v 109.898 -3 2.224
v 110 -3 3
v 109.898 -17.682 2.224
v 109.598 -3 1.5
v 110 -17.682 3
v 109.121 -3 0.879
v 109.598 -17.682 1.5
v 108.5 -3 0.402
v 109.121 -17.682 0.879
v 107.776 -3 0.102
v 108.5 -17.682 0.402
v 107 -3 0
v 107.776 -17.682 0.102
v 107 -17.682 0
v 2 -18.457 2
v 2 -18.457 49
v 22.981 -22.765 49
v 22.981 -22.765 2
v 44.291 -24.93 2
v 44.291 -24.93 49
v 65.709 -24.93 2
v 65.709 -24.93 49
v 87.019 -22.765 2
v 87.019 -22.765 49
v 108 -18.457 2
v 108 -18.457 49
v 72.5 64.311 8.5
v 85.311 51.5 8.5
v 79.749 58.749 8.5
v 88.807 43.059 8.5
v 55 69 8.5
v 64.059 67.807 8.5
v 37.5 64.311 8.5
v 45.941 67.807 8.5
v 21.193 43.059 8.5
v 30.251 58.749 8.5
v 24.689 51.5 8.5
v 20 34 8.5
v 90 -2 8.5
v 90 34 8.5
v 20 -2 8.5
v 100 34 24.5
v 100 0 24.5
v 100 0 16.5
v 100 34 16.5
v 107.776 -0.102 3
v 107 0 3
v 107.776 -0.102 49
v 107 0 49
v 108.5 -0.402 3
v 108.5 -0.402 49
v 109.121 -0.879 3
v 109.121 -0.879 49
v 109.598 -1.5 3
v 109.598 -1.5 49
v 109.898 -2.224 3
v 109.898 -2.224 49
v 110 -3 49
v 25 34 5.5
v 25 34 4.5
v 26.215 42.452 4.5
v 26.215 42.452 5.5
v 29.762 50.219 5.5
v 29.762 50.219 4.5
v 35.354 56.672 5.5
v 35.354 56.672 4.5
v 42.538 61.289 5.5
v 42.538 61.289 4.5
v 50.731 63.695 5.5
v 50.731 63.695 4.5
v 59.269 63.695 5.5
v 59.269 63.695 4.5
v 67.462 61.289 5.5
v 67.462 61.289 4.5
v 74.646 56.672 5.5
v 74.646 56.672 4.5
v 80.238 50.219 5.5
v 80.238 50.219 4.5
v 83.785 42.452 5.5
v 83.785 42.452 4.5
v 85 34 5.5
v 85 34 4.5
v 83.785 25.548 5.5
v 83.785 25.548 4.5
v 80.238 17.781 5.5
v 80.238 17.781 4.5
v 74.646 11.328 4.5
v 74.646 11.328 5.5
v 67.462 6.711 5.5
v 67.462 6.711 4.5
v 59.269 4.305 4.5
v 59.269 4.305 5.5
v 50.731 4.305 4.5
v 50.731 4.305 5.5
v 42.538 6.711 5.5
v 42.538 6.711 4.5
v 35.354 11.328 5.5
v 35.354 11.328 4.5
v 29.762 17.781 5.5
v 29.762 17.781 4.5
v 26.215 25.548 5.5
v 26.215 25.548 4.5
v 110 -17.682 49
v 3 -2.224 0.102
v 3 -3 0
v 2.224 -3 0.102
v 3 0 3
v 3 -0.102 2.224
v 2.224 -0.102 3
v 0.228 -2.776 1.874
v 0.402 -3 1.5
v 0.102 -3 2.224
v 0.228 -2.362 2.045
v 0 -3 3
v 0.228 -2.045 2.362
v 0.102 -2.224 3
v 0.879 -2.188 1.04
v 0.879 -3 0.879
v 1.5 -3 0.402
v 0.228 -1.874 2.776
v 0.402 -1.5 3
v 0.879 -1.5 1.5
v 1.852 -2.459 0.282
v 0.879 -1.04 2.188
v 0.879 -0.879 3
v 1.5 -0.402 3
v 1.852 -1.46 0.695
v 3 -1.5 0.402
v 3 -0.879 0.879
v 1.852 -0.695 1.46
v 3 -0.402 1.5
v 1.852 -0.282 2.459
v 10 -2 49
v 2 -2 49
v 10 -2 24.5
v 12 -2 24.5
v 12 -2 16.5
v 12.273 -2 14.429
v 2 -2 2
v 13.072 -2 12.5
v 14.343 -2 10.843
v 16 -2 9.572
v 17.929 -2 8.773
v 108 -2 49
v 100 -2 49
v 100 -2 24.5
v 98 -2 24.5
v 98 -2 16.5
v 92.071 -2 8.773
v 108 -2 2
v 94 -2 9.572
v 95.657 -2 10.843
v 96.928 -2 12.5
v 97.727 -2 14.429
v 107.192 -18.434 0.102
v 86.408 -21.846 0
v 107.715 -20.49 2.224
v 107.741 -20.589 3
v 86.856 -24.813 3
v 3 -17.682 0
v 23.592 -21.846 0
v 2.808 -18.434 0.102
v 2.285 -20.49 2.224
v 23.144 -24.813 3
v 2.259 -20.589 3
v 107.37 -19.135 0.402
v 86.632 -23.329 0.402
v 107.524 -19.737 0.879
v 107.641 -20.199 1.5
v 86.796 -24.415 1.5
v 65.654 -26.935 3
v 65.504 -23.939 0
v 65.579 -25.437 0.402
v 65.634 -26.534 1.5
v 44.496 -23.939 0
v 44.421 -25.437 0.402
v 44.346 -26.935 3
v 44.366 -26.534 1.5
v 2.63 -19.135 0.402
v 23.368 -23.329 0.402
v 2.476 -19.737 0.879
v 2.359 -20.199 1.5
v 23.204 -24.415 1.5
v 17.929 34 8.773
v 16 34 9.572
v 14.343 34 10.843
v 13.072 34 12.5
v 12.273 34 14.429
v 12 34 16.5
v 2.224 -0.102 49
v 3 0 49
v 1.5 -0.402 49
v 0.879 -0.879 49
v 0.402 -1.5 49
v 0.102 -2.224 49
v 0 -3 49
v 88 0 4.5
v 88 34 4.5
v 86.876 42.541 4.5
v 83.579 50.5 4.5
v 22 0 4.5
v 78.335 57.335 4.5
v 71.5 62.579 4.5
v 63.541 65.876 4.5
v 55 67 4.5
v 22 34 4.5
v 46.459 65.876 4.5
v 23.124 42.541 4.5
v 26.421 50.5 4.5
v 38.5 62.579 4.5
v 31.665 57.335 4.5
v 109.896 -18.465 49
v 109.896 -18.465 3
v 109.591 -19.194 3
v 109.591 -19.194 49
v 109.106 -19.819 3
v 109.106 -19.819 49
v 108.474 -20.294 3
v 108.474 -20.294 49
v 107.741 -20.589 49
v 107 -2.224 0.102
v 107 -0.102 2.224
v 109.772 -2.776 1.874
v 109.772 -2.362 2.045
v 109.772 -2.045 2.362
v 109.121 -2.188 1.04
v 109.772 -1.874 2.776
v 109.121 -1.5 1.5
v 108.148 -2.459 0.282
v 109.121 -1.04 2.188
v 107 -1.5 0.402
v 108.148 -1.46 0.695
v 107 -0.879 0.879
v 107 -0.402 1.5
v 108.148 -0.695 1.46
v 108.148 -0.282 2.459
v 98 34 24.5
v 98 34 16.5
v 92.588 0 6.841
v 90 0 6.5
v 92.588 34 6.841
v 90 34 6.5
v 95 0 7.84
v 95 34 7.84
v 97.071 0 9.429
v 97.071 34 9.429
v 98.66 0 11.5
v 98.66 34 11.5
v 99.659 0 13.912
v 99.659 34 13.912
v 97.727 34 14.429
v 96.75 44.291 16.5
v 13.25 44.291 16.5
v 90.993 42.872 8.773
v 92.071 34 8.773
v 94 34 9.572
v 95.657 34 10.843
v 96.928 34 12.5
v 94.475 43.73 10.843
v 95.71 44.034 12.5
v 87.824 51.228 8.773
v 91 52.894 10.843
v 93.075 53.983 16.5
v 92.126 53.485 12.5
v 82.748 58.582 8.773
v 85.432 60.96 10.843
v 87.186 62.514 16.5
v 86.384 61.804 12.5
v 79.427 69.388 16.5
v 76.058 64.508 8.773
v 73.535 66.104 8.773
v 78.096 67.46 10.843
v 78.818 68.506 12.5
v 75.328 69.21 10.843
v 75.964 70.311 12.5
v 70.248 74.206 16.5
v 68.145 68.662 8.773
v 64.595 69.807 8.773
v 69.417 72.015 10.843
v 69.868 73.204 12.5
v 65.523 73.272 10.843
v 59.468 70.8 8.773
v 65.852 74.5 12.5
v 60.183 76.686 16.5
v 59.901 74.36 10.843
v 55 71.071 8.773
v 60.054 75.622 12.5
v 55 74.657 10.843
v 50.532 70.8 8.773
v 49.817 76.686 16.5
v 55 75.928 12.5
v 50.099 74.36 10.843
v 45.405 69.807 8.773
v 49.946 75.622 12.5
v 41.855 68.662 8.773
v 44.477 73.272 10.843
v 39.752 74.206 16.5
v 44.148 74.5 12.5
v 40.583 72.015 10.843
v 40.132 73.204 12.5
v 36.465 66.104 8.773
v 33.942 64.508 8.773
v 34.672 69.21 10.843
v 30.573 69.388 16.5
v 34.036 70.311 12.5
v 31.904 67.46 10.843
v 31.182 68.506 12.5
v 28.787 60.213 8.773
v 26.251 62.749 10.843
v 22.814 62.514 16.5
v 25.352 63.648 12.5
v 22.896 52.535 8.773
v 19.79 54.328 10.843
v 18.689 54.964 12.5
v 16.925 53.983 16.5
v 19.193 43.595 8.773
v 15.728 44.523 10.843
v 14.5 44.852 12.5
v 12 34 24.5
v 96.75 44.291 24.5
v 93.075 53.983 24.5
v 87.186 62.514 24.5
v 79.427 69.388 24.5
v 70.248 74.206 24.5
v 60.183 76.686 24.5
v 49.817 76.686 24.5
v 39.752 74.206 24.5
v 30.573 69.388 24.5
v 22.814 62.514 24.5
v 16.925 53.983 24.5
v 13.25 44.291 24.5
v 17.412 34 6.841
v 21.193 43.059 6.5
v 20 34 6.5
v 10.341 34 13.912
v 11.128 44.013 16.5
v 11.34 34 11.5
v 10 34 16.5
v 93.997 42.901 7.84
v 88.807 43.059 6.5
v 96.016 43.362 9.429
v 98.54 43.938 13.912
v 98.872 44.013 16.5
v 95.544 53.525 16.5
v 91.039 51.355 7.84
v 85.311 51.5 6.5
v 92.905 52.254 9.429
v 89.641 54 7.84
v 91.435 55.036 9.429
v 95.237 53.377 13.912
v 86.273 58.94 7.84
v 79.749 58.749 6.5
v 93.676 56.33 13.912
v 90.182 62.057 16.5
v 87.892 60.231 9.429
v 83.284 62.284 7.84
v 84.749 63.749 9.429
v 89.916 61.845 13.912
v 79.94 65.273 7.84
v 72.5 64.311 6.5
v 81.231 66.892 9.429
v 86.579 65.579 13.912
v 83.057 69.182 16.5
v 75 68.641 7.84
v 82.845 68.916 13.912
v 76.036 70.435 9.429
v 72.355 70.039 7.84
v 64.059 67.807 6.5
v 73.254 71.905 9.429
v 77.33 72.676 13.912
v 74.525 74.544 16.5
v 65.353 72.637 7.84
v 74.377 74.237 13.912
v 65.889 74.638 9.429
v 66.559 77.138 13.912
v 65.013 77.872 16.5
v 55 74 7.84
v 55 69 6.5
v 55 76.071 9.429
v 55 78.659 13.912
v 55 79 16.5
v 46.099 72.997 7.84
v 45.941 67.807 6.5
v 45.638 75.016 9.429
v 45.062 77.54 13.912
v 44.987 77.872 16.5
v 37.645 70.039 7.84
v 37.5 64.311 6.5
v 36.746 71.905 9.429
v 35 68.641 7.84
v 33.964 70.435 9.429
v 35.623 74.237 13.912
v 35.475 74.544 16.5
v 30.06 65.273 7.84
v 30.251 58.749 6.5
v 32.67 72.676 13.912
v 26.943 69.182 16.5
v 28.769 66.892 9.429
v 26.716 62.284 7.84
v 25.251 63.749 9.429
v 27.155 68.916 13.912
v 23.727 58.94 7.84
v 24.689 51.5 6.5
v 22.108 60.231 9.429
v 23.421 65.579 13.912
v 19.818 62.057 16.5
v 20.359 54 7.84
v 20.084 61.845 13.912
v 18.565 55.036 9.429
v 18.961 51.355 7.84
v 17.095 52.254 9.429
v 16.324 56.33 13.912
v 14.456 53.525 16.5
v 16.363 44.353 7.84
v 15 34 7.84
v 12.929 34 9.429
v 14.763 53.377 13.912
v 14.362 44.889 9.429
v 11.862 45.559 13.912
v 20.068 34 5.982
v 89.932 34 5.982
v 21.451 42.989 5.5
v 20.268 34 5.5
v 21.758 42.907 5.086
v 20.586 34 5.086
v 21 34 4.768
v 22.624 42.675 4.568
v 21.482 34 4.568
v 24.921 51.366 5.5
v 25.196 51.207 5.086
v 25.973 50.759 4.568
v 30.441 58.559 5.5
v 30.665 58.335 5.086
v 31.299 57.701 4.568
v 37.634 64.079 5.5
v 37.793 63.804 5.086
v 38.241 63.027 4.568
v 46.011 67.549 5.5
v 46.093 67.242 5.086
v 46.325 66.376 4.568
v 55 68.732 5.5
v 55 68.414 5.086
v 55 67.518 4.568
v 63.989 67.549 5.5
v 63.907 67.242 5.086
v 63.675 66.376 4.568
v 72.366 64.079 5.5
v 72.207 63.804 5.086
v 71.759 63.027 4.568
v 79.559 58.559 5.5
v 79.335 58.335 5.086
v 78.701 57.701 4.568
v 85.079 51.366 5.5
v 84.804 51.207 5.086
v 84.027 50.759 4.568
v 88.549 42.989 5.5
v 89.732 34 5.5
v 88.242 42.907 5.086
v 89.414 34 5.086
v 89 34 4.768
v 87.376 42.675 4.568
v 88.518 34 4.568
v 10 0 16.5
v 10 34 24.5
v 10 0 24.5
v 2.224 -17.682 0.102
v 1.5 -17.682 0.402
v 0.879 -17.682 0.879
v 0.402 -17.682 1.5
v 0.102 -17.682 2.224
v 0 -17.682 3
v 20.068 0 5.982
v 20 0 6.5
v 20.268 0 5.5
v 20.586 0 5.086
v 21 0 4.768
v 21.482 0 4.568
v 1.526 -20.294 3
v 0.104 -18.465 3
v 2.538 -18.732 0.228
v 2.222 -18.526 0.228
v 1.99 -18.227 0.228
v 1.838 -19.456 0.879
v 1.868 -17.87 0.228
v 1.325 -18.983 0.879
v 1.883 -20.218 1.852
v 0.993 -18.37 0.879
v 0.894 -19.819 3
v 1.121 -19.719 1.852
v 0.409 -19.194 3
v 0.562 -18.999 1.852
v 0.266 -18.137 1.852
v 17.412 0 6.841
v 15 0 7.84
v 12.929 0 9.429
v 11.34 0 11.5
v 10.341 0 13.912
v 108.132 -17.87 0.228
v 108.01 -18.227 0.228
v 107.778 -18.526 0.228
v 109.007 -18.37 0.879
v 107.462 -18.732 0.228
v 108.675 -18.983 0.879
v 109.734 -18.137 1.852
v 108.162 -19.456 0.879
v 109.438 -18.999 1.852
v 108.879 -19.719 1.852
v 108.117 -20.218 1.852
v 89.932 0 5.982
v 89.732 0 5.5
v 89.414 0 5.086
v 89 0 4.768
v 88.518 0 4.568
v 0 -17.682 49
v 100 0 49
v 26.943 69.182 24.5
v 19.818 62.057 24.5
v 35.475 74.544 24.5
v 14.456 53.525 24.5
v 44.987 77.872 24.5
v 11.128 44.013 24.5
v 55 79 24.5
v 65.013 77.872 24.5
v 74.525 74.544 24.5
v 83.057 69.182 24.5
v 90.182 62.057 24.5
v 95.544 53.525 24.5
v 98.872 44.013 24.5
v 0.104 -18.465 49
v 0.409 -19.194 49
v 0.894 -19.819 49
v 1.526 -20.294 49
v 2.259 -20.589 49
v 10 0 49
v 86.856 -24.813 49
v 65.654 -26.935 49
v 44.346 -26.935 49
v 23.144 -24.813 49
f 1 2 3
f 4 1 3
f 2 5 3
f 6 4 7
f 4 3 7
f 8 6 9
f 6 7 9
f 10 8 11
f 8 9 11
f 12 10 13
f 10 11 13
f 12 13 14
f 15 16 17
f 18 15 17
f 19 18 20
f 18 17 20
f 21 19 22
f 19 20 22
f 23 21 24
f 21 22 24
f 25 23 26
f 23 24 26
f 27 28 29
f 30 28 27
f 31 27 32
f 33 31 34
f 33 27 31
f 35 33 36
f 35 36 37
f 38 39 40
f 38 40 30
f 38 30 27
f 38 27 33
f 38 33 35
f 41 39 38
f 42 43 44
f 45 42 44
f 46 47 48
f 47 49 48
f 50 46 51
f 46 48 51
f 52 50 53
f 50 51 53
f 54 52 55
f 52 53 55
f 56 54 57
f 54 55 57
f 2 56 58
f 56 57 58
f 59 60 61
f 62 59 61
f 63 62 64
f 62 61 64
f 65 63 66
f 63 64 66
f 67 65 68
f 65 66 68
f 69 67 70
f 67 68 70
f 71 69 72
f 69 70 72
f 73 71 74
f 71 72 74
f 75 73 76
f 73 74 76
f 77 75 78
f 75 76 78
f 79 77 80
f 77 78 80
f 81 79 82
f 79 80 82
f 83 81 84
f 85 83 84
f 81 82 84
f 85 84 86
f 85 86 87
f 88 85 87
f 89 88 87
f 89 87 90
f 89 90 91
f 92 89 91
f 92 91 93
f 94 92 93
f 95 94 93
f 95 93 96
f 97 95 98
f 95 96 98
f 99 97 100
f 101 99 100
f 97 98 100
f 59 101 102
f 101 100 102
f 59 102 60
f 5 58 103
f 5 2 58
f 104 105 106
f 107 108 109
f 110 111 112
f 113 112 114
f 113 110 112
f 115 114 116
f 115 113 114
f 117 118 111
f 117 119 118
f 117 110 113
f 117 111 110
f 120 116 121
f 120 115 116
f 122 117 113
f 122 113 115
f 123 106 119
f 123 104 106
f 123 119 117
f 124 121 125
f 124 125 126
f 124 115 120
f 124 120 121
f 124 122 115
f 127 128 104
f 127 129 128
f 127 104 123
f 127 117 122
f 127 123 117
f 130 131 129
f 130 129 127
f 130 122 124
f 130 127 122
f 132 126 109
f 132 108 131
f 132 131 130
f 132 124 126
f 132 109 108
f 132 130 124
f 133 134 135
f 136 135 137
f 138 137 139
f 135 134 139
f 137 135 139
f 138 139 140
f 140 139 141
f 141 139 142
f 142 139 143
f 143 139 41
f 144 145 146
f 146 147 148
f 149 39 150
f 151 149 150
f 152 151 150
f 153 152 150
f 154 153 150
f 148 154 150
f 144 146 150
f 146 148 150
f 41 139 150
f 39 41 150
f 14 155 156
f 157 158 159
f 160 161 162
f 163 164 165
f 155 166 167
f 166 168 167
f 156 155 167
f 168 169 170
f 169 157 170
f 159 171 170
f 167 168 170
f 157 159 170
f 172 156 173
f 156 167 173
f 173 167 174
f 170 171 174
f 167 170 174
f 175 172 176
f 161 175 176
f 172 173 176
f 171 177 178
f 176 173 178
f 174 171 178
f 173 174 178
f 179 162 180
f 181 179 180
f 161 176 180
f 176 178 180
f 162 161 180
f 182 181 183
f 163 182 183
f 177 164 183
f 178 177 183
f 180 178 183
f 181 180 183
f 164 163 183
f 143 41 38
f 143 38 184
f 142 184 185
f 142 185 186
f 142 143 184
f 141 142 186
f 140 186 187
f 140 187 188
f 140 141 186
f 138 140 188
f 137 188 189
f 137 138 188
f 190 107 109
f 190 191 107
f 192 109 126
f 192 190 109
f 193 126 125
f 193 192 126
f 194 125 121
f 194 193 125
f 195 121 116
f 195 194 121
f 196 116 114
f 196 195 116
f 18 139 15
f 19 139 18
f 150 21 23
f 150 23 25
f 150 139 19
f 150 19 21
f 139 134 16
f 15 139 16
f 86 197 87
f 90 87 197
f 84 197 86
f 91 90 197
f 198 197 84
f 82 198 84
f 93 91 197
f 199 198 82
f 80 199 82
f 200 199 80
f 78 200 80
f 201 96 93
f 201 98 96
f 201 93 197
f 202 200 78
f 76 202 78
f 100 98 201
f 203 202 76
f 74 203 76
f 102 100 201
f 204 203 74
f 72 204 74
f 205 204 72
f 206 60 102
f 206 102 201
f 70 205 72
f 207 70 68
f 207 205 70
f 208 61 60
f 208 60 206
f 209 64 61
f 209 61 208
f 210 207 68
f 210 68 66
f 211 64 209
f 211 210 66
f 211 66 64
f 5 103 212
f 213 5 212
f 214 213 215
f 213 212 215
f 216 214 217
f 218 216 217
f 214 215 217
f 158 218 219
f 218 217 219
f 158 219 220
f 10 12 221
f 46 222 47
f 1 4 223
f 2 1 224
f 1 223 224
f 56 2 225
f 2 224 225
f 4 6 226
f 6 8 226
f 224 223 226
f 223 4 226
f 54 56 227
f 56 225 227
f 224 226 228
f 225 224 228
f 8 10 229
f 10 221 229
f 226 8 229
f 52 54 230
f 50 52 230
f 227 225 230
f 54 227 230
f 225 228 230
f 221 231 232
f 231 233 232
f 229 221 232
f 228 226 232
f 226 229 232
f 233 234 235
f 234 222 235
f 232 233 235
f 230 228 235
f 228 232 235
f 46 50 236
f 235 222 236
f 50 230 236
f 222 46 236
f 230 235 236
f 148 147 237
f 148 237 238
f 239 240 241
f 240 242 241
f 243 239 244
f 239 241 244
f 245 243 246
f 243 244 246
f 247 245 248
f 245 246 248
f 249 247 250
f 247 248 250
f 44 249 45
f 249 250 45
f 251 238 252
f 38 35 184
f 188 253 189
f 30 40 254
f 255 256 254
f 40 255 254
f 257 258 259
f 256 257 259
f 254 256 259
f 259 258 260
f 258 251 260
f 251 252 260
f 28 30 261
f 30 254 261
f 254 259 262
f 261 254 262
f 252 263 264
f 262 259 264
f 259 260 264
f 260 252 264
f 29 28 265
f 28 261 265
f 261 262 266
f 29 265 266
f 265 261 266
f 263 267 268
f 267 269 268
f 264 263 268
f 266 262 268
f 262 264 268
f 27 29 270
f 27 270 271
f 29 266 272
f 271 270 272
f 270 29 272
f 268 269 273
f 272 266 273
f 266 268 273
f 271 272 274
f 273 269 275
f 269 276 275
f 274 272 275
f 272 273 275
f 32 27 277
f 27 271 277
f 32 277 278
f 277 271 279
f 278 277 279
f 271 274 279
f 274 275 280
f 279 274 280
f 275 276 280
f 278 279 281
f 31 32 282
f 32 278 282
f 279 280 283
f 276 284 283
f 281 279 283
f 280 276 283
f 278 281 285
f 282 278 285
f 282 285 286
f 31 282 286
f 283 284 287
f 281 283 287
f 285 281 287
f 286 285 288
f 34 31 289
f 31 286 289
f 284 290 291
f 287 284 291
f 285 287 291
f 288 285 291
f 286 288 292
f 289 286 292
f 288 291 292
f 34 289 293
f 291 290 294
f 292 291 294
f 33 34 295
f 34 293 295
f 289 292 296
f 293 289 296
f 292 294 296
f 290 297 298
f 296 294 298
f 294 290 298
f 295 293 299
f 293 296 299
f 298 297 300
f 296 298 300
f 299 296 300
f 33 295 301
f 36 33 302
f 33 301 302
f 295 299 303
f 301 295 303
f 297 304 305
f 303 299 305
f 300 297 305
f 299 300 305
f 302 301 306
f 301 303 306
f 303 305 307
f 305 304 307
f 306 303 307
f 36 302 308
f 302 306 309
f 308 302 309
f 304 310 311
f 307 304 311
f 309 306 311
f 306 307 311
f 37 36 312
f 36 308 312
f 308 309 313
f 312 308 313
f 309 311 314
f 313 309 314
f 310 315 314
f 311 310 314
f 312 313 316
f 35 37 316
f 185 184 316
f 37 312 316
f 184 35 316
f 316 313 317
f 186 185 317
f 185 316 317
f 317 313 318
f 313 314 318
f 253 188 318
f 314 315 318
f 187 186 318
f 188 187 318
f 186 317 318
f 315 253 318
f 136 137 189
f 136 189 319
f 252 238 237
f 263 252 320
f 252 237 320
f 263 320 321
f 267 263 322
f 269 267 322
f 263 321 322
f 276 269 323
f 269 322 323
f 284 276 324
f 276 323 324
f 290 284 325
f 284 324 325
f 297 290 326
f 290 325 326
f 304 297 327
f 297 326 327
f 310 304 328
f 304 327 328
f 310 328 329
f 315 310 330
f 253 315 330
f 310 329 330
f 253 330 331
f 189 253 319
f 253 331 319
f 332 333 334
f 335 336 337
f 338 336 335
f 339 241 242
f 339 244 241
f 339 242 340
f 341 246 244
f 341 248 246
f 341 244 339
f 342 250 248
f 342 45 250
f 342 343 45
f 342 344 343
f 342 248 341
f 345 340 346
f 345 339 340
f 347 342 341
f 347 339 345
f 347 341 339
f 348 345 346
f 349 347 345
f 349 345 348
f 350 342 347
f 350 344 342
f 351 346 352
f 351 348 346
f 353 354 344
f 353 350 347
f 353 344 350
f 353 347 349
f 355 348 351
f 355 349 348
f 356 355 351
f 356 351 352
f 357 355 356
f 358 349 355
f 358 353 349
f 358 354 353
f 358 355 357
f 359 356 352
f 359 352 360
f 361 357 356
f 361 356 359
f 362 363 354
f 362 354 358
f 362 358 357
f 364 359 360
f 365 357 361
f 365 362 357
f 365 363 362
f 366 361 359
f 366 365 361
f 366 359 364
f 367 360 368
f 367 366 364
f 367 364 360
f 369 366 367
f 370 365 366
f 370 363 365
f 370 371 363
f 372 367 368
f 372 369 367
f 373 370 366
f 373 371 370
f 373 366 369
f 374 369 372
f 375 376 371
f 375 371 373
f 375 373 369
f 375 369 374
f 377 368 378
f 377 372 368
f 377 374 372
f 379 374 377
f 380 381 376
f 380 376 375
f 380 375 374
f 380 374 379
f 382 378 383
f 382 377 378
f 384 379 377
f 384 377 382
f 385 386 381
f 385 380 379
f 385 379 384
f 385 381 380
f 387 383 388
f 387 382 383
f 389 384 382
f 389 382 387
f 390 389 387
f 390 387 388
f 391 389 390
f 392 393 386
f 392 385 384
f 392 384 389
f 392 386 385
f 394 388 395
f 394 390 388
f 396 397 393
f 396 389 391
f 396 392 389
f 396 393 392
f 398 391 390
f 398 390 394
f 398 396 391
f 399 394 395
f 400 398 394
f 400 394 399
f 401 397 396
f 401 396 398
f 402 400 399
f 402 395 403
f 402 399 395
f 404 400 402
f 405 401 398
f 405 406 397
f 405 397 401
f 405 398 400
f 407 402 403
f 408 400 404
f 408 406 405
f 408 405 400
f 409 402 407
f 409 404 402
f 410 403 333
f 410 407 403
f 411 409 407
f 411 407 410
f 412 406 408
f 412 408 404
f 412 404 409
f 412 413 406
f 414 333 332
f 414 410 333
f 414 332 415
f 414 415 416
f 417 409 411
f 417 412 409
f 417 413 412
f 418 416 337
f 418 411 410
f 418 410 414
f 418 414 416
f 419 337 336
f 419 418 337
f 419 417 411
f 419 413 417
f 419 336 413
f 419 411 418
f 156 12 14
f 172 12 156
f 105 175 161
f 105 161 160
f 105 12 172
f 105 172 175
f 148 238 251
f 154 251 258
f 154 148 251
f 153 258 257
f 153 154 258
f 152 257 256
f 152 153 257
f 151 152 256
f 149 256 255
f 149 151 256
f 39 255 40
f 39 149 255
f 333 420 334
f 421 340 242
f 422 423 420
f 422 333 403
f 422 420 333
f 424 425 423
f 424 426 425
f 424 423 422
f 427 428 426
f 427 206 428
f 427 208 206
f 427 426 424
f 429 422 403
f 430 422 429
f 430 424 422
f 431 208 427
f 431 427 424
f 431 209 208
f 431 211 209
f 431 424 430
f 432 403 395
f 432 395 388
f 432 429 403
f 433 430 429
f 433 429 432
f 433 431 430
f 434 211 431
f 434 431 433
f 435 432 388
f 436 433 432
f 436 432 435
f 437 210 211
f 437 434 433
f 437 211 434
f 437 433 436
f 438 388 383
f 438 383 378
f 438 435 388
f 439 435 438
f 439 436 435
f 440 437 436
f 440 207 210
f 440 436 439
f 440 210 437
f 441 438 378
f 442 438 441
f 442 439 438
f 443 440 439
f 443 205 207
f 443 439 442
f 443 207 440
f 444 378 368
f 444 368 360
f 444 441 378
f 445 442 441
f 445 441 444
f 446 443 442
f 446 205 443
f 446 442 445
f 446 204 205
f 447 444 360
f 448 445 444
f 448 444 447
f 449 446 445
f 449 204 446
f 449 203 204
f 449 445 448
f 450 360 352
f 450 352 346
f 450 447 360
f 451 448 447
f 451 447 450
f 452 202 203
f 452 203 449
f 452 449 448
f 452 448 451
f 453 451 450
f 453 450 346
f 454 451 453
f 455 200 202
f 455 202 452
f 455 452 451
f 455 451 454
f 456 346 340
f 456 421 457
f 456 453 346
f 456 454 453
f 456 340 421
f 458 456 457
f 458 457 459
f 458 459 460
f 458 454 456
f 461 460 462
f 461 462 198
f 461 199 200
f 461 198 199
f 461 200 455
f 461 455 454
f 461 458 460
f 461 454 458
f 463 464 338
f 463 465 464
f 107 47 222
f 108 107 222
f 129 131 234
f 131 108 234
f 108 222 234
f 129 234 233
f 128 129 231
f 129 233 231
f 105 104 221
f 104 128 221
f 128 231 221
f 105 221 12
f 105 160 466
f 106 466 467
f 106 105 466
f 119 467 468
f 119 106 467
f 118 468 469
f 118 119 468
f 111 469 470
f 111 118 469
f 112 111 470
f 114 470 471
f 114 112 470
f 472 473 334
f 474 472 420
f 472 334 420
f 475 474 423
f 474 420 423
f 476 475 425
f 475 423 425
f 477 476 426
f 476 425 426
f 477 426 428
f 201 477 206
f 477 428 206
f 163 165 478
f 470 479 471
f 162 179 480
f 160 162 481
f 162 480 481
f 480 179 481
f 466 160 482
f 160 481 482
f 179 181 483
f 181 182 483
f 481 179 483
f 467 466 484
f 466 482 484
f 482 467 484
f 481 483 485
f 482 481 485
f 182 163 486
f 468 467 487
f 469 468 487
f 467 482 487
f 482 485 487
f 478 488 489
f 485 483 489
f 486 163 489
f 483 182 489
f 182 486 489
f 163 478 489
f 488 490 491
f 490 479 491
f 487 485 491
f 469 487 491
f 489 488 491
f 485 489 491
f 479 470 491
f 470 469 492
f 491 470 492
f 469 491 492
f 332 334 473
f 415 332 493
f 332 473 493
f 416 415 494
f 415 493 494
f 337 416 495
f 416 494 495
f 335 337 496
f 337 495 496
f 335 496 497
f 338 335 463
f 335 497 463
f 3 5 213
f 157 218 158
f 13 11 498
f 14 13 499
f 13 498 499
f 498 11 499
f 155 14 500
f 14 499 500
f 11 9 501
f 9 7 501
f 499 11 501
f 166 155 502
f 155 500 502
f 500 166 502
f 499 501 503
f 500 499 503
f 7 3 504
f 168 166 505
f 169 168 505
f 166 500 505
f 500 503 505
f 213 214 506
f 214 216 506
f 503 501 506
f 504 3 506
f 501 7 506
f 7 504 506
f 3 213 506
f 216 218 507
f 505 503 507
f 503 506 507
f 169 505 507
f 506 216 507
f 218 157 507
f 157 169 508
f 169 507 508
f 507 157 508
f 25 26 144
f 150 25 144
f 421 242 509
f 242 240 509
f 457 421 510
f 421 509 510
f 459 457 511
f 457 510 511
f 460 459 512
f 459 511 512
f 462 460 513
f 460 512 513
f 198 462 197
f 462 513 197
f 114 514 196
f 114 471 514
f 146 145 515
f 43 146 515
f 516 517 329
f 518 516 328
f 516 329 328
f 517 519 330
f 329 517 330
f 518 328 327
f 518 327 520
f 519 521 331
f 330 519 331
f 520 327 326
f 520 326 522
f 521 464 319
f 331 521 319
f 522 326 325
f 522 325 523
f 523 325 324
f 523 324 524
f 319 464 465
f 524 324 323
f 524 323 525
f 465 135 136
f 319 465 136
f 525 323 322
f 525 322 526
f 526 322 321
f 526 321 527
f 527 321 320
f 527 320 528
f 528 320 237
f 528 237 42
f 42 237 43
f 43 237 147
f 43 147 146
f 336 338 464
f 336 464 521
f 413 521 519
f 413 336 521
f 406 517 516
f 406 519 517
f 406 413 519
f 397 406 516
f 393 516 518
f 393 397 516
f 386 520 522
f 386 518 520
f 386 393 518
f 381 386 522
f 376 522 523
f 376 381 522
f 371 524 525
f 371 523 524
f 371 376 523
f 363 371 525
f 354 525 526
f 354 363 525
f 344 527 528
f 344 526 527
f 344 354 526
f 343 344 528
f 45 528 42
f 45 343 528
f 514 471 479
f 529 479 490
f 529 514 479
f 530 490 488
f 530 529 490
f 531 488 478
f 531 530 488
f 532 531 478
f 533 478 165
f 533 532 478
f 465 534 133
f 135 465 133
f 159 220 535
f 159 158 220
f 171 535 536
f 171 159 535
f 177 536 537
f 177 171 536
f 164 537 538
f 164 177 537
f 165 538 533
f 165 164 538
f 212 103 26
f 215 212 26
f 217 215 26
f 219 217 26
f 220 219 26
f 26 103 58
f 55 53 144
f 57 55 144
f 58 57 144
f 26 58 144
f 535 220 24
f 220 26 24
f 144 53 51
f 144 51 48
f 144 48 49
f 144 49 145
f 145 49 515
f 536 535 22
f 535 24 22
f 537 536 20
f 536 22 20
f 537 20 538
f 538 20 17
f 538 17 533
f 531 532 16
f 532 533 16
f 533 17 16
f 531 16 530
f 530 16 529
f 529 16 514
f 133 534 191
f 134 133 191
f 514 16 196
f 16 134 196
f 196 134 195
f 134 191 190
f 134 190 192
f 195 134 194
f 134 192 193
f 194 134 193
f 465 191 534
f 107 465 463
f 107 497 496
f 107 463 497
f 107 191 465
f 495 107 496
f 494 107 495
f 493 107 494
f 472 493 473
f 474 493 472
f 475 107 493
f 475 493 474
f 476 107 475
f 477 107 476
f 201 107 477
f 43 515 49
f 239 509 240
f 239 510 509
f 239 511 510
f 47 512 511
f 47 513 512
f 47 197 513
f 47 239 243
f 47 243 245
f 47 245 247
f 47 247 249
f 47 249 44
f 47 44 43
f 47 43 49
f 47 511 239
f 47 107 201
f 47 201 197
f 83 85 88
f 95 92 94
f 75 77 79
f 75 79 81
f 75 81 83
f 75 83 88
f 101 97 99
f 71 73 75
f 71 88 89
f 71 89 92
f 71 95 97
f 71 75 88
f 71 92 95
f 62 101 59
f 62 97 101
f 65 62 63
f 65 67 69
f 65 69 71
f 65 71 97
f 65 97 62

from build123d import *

# Parameters (mm, degrees)
BOSS_EXTRUDE1_DEPTH = 49
CUT_EXTRUDE1_DEPTH  = 39
SHELL2_START        = 2
SHELL2_DEPTH        = 8
BOSS_EXTRUDE8_START = -81
SKETCH5_W           = 90
SKETCH5_H           = 18
BOSS_EXTRUDE8_DEPTH = 81
CUT_EXTRUDE2_DEPTH  = 142.941008873
FILLET1_R           = 10
SHELL4_DEPTH        = 34
SHELL4_2_ANGLE      = 180
CUT_EXTRUDE6_START  = -3
CUT_EXTRUDE6_DEPTH  = 3
BOSS_EXTRUDE9_DEPTH = 2
SKETCH10_R          = 30
CUT_EXTRUDE4_DEPTH  = 1
FILLET2_R           = 2
FILLET3_R           = 3


with BuildPart() as part:
    # Sketch1 → Boss-Extrude1 (new body)
    with BuildSketch(Plane.XY):
        with BuildLine():
            Line((0, 0), (110, 0))
            Line((110, 0), (110, -20))
            ThreePointArc((110, -20), (55, -27.200969375), (0, -20))
            Line((0, -20), (0, 0))
        make_face()
    extrude(amount=BOSS_EXTRUDE1_DEPTH)

    # Sketch3 → Cut-Extrude1 (cut)
    with BuildSketch(Plane.XY.offset(49)):
        with BuildLine():
            Line((10, 3.939932323), (10, -2))
            Line((10, -2), (2, -2))
            Line((2, -2), (2, -18.45731355))
            ThreePointArc((2, -18.45731355), (55, -25.200969375), (108, -18.45731355))
            Line((108, -18.45731355), (108, -2))
            Line((108, -2), (100, -2))
            Line((100, -2), (100, 3.939932323))
            Line((100, 3.939932323), (10, 3.939932323))
        make_face()
    extrude(amount=-CUT_EXTRUDE1_DEPTH, mode=Mode.SUBTRACT)

    # Shell2: read off the stored shape, not the designer's step
    # Shell2 outline → Shell2 (cut)
    with BuildSketch(Plane.XY.offset(SHELL2_START)):
        with BuildLine():
            Line((108, -18.45731355), (108, -2))
            Line((108, -2), (2, -2))
            Line((2, -2), (2, -18.45731355))
            ThreePointArc((2, -18.45731355), (55, -25.200969375), (108, -18.45731355))
        make_face()
    extrude(amount=SHELL2_DEPTH, mode=Mode.SUBTRACT)

    # Sketch5 → Boss-Extrude8 (add)
    with BuildSketch(Plane(origin=(0, 79, 0), x_dir=(1, 0, 0), z_dir=(0, 1, 0)).offset(BOSS_EXTRUDE8_START)):
        with Locations((55, -15.5)):
            Rectangle(SKETCH5_W, SKETCH5_H)
    extrude(amount=BOSS_EXTRUDE8_DEPTH)

    # Sketch6 → Cut-Extrude2 (cut, through all)
    with BuildSketch(Plane(origin=(0, 0, 6.5), x_dir=(-1, 0, 0), z_dir=(0, 0, -1))):
        with BuildLine():
            Line((-100, 84.89286518), (-10, 84.89286518))
            Line((-10, 84.89286518), (-10, 34))
            ThreePointArc((-10, 34), (-55, 79), (-100, 34))
            Line((-100, 34), (-100, 84.89286518))
        make_face()
    extrude(amount=-CUT_EXTRUDE2_DEPTH, mode=Mode.SUBTRACT)

    # Fillet1
    fillet1_edges = [part.edges().sort_by_distance(p)[0] for p in [
        (100, 17, 6.5),
        (10, 17, 6.5),
        (55, 79, 6.5),
    ]]
    fillet(fillet1_edges, radius=FILLET1_R)

    # Shell4: read off the stored shape, not the designer's step
    # Shell4 outline → Shell4 (cut)
    with BuildSketch(Plane(origin=(0, 0, 0), x_dir=(1, 0, 0), z_dir=(0, 1, 0))):
        with BuildLine():
            ThreePointArc((20, -8.5), (14.343145751, -10.843145751), (12, -16.5))
            Line((12, -16.5), (12, -24.5))
            Line((12, -24.5), (98, -24.5))
            Line((98, -24.5), (98, -16.5))
            ThreePointArc((98, -16.5), (95.656854249, -10.843145751), (90, -8.5))
            Line((90, -8.5), (20, -8.5))
        make_face()
    extrude(amount=SHELL4_DEPTH, mode=Mode.SUBTRACT)

    # Shell4 2 outline → Shell4 2 (revolve, cut)
    with BuildSketch(Plane(origin=(55, 34, 0), x_dir=(1, 0, 0), z_dir=(0, -1, 0))):
        with BuildLine():
            Line((0, 24.5), (0, 8.5))
            Line((0, 8.5), (35, 8.5))
            ThreePointArc((35, 8.5), (40.656854249, 10.843145751), (43, 16.5))
            Line((43, 16.5), (43, 24.5))
            Line((43, 24.5), (0, 24.5))
        make_face()
    revolve(axis=Axis((55, 34, 0), (0, 0, 1)), revolution_arc=SHELL4_2_ANGLE, mode=Mode.SUBTRACT)

    # Sketch12 → Cut-Extrude6 (cut)
    with BuildSketch(Plane(origin=(0, 0, 0), x_dir=(1, 0, 0), z_dir=(0, 1, 0)).offset(CUT_EXTRUDE6_START)):
        with BuildLine():
            Line((90, -8.5), (20, -8.5))
            ThreePointArc((20, -8.5), (14.343145751, -10.843145751), (12, -16.5))
            Line((12, -16.5), (12, -24.5))
            Line((12, -24.5), (98, -24.5))
            Line((98, -24.5), (98, -16.5))
            ThreePointArc((98, -16.5), (95.656854249, -10.843145751), (90, -8.5))
        make_face()
    extrude(amount=CUT_EXTRUDE6_DEPTH, mode=Mode.SUBTRACT)

    # Sketch9 → Boss-Extrude9 (add)
    with BuildSketch(Plane(origin=(0, 0, 6.5), x_dir=(-1, 0, 0), z_dir=(0, 0, -1))):
        with BuildLine():
            Line((-90, 0), (-20, 0))
            Line((-20, 0), (-20, 34))
            ThreePointArc((-20, 34), (-55, 69), (-90, 34))
            Line((-90, 34), (-90, 0))
        make_face()
    extrude(amount=BOSS_EXTRUDE9_DEPTH)

    # Sketch10 → Cut-Extrude4 (cut)
    with BuildSketch(Plane(origin=(0, 0, 4.5), x_dir=(-1, 0, 0), z_dir=(0, 0, -1))):
        with Locations((-55, 34)):
            Circle(SKETCH10_R)
    extrude(amount=-CUT_EXTRUDE4_DEPTH, mode=Mode.SUBTRACT)

    # Fillet2
    fillet2_edges = [part.edges().sort_by_distance(p)[0] for p in [
        (20, 17, 4.5),
        (55, 69, 4.5),
        (90, 17, 4.5),
    ]]
    fillet(fillet2_edges, radius=FILLET2_R - 0.0001)  # a hair under: the kernel refuses the full size

    # Fillet3
    fillet3_edges = [part.edges().sort_by_distance(p)[0] for p in [
        (55, 0, 0),
        (110, -10, 0),
        (55, -27.200969375, 0),
        (0, -10, 0),
        (0, 0, 24.5),
        (110, 0, 24.5),
        (110, -20, 24.5),
        (0, -20, 24.5),
    ]]
    fillet(fillet3_edges, radius=FILLET3_R)


solid = part.part
